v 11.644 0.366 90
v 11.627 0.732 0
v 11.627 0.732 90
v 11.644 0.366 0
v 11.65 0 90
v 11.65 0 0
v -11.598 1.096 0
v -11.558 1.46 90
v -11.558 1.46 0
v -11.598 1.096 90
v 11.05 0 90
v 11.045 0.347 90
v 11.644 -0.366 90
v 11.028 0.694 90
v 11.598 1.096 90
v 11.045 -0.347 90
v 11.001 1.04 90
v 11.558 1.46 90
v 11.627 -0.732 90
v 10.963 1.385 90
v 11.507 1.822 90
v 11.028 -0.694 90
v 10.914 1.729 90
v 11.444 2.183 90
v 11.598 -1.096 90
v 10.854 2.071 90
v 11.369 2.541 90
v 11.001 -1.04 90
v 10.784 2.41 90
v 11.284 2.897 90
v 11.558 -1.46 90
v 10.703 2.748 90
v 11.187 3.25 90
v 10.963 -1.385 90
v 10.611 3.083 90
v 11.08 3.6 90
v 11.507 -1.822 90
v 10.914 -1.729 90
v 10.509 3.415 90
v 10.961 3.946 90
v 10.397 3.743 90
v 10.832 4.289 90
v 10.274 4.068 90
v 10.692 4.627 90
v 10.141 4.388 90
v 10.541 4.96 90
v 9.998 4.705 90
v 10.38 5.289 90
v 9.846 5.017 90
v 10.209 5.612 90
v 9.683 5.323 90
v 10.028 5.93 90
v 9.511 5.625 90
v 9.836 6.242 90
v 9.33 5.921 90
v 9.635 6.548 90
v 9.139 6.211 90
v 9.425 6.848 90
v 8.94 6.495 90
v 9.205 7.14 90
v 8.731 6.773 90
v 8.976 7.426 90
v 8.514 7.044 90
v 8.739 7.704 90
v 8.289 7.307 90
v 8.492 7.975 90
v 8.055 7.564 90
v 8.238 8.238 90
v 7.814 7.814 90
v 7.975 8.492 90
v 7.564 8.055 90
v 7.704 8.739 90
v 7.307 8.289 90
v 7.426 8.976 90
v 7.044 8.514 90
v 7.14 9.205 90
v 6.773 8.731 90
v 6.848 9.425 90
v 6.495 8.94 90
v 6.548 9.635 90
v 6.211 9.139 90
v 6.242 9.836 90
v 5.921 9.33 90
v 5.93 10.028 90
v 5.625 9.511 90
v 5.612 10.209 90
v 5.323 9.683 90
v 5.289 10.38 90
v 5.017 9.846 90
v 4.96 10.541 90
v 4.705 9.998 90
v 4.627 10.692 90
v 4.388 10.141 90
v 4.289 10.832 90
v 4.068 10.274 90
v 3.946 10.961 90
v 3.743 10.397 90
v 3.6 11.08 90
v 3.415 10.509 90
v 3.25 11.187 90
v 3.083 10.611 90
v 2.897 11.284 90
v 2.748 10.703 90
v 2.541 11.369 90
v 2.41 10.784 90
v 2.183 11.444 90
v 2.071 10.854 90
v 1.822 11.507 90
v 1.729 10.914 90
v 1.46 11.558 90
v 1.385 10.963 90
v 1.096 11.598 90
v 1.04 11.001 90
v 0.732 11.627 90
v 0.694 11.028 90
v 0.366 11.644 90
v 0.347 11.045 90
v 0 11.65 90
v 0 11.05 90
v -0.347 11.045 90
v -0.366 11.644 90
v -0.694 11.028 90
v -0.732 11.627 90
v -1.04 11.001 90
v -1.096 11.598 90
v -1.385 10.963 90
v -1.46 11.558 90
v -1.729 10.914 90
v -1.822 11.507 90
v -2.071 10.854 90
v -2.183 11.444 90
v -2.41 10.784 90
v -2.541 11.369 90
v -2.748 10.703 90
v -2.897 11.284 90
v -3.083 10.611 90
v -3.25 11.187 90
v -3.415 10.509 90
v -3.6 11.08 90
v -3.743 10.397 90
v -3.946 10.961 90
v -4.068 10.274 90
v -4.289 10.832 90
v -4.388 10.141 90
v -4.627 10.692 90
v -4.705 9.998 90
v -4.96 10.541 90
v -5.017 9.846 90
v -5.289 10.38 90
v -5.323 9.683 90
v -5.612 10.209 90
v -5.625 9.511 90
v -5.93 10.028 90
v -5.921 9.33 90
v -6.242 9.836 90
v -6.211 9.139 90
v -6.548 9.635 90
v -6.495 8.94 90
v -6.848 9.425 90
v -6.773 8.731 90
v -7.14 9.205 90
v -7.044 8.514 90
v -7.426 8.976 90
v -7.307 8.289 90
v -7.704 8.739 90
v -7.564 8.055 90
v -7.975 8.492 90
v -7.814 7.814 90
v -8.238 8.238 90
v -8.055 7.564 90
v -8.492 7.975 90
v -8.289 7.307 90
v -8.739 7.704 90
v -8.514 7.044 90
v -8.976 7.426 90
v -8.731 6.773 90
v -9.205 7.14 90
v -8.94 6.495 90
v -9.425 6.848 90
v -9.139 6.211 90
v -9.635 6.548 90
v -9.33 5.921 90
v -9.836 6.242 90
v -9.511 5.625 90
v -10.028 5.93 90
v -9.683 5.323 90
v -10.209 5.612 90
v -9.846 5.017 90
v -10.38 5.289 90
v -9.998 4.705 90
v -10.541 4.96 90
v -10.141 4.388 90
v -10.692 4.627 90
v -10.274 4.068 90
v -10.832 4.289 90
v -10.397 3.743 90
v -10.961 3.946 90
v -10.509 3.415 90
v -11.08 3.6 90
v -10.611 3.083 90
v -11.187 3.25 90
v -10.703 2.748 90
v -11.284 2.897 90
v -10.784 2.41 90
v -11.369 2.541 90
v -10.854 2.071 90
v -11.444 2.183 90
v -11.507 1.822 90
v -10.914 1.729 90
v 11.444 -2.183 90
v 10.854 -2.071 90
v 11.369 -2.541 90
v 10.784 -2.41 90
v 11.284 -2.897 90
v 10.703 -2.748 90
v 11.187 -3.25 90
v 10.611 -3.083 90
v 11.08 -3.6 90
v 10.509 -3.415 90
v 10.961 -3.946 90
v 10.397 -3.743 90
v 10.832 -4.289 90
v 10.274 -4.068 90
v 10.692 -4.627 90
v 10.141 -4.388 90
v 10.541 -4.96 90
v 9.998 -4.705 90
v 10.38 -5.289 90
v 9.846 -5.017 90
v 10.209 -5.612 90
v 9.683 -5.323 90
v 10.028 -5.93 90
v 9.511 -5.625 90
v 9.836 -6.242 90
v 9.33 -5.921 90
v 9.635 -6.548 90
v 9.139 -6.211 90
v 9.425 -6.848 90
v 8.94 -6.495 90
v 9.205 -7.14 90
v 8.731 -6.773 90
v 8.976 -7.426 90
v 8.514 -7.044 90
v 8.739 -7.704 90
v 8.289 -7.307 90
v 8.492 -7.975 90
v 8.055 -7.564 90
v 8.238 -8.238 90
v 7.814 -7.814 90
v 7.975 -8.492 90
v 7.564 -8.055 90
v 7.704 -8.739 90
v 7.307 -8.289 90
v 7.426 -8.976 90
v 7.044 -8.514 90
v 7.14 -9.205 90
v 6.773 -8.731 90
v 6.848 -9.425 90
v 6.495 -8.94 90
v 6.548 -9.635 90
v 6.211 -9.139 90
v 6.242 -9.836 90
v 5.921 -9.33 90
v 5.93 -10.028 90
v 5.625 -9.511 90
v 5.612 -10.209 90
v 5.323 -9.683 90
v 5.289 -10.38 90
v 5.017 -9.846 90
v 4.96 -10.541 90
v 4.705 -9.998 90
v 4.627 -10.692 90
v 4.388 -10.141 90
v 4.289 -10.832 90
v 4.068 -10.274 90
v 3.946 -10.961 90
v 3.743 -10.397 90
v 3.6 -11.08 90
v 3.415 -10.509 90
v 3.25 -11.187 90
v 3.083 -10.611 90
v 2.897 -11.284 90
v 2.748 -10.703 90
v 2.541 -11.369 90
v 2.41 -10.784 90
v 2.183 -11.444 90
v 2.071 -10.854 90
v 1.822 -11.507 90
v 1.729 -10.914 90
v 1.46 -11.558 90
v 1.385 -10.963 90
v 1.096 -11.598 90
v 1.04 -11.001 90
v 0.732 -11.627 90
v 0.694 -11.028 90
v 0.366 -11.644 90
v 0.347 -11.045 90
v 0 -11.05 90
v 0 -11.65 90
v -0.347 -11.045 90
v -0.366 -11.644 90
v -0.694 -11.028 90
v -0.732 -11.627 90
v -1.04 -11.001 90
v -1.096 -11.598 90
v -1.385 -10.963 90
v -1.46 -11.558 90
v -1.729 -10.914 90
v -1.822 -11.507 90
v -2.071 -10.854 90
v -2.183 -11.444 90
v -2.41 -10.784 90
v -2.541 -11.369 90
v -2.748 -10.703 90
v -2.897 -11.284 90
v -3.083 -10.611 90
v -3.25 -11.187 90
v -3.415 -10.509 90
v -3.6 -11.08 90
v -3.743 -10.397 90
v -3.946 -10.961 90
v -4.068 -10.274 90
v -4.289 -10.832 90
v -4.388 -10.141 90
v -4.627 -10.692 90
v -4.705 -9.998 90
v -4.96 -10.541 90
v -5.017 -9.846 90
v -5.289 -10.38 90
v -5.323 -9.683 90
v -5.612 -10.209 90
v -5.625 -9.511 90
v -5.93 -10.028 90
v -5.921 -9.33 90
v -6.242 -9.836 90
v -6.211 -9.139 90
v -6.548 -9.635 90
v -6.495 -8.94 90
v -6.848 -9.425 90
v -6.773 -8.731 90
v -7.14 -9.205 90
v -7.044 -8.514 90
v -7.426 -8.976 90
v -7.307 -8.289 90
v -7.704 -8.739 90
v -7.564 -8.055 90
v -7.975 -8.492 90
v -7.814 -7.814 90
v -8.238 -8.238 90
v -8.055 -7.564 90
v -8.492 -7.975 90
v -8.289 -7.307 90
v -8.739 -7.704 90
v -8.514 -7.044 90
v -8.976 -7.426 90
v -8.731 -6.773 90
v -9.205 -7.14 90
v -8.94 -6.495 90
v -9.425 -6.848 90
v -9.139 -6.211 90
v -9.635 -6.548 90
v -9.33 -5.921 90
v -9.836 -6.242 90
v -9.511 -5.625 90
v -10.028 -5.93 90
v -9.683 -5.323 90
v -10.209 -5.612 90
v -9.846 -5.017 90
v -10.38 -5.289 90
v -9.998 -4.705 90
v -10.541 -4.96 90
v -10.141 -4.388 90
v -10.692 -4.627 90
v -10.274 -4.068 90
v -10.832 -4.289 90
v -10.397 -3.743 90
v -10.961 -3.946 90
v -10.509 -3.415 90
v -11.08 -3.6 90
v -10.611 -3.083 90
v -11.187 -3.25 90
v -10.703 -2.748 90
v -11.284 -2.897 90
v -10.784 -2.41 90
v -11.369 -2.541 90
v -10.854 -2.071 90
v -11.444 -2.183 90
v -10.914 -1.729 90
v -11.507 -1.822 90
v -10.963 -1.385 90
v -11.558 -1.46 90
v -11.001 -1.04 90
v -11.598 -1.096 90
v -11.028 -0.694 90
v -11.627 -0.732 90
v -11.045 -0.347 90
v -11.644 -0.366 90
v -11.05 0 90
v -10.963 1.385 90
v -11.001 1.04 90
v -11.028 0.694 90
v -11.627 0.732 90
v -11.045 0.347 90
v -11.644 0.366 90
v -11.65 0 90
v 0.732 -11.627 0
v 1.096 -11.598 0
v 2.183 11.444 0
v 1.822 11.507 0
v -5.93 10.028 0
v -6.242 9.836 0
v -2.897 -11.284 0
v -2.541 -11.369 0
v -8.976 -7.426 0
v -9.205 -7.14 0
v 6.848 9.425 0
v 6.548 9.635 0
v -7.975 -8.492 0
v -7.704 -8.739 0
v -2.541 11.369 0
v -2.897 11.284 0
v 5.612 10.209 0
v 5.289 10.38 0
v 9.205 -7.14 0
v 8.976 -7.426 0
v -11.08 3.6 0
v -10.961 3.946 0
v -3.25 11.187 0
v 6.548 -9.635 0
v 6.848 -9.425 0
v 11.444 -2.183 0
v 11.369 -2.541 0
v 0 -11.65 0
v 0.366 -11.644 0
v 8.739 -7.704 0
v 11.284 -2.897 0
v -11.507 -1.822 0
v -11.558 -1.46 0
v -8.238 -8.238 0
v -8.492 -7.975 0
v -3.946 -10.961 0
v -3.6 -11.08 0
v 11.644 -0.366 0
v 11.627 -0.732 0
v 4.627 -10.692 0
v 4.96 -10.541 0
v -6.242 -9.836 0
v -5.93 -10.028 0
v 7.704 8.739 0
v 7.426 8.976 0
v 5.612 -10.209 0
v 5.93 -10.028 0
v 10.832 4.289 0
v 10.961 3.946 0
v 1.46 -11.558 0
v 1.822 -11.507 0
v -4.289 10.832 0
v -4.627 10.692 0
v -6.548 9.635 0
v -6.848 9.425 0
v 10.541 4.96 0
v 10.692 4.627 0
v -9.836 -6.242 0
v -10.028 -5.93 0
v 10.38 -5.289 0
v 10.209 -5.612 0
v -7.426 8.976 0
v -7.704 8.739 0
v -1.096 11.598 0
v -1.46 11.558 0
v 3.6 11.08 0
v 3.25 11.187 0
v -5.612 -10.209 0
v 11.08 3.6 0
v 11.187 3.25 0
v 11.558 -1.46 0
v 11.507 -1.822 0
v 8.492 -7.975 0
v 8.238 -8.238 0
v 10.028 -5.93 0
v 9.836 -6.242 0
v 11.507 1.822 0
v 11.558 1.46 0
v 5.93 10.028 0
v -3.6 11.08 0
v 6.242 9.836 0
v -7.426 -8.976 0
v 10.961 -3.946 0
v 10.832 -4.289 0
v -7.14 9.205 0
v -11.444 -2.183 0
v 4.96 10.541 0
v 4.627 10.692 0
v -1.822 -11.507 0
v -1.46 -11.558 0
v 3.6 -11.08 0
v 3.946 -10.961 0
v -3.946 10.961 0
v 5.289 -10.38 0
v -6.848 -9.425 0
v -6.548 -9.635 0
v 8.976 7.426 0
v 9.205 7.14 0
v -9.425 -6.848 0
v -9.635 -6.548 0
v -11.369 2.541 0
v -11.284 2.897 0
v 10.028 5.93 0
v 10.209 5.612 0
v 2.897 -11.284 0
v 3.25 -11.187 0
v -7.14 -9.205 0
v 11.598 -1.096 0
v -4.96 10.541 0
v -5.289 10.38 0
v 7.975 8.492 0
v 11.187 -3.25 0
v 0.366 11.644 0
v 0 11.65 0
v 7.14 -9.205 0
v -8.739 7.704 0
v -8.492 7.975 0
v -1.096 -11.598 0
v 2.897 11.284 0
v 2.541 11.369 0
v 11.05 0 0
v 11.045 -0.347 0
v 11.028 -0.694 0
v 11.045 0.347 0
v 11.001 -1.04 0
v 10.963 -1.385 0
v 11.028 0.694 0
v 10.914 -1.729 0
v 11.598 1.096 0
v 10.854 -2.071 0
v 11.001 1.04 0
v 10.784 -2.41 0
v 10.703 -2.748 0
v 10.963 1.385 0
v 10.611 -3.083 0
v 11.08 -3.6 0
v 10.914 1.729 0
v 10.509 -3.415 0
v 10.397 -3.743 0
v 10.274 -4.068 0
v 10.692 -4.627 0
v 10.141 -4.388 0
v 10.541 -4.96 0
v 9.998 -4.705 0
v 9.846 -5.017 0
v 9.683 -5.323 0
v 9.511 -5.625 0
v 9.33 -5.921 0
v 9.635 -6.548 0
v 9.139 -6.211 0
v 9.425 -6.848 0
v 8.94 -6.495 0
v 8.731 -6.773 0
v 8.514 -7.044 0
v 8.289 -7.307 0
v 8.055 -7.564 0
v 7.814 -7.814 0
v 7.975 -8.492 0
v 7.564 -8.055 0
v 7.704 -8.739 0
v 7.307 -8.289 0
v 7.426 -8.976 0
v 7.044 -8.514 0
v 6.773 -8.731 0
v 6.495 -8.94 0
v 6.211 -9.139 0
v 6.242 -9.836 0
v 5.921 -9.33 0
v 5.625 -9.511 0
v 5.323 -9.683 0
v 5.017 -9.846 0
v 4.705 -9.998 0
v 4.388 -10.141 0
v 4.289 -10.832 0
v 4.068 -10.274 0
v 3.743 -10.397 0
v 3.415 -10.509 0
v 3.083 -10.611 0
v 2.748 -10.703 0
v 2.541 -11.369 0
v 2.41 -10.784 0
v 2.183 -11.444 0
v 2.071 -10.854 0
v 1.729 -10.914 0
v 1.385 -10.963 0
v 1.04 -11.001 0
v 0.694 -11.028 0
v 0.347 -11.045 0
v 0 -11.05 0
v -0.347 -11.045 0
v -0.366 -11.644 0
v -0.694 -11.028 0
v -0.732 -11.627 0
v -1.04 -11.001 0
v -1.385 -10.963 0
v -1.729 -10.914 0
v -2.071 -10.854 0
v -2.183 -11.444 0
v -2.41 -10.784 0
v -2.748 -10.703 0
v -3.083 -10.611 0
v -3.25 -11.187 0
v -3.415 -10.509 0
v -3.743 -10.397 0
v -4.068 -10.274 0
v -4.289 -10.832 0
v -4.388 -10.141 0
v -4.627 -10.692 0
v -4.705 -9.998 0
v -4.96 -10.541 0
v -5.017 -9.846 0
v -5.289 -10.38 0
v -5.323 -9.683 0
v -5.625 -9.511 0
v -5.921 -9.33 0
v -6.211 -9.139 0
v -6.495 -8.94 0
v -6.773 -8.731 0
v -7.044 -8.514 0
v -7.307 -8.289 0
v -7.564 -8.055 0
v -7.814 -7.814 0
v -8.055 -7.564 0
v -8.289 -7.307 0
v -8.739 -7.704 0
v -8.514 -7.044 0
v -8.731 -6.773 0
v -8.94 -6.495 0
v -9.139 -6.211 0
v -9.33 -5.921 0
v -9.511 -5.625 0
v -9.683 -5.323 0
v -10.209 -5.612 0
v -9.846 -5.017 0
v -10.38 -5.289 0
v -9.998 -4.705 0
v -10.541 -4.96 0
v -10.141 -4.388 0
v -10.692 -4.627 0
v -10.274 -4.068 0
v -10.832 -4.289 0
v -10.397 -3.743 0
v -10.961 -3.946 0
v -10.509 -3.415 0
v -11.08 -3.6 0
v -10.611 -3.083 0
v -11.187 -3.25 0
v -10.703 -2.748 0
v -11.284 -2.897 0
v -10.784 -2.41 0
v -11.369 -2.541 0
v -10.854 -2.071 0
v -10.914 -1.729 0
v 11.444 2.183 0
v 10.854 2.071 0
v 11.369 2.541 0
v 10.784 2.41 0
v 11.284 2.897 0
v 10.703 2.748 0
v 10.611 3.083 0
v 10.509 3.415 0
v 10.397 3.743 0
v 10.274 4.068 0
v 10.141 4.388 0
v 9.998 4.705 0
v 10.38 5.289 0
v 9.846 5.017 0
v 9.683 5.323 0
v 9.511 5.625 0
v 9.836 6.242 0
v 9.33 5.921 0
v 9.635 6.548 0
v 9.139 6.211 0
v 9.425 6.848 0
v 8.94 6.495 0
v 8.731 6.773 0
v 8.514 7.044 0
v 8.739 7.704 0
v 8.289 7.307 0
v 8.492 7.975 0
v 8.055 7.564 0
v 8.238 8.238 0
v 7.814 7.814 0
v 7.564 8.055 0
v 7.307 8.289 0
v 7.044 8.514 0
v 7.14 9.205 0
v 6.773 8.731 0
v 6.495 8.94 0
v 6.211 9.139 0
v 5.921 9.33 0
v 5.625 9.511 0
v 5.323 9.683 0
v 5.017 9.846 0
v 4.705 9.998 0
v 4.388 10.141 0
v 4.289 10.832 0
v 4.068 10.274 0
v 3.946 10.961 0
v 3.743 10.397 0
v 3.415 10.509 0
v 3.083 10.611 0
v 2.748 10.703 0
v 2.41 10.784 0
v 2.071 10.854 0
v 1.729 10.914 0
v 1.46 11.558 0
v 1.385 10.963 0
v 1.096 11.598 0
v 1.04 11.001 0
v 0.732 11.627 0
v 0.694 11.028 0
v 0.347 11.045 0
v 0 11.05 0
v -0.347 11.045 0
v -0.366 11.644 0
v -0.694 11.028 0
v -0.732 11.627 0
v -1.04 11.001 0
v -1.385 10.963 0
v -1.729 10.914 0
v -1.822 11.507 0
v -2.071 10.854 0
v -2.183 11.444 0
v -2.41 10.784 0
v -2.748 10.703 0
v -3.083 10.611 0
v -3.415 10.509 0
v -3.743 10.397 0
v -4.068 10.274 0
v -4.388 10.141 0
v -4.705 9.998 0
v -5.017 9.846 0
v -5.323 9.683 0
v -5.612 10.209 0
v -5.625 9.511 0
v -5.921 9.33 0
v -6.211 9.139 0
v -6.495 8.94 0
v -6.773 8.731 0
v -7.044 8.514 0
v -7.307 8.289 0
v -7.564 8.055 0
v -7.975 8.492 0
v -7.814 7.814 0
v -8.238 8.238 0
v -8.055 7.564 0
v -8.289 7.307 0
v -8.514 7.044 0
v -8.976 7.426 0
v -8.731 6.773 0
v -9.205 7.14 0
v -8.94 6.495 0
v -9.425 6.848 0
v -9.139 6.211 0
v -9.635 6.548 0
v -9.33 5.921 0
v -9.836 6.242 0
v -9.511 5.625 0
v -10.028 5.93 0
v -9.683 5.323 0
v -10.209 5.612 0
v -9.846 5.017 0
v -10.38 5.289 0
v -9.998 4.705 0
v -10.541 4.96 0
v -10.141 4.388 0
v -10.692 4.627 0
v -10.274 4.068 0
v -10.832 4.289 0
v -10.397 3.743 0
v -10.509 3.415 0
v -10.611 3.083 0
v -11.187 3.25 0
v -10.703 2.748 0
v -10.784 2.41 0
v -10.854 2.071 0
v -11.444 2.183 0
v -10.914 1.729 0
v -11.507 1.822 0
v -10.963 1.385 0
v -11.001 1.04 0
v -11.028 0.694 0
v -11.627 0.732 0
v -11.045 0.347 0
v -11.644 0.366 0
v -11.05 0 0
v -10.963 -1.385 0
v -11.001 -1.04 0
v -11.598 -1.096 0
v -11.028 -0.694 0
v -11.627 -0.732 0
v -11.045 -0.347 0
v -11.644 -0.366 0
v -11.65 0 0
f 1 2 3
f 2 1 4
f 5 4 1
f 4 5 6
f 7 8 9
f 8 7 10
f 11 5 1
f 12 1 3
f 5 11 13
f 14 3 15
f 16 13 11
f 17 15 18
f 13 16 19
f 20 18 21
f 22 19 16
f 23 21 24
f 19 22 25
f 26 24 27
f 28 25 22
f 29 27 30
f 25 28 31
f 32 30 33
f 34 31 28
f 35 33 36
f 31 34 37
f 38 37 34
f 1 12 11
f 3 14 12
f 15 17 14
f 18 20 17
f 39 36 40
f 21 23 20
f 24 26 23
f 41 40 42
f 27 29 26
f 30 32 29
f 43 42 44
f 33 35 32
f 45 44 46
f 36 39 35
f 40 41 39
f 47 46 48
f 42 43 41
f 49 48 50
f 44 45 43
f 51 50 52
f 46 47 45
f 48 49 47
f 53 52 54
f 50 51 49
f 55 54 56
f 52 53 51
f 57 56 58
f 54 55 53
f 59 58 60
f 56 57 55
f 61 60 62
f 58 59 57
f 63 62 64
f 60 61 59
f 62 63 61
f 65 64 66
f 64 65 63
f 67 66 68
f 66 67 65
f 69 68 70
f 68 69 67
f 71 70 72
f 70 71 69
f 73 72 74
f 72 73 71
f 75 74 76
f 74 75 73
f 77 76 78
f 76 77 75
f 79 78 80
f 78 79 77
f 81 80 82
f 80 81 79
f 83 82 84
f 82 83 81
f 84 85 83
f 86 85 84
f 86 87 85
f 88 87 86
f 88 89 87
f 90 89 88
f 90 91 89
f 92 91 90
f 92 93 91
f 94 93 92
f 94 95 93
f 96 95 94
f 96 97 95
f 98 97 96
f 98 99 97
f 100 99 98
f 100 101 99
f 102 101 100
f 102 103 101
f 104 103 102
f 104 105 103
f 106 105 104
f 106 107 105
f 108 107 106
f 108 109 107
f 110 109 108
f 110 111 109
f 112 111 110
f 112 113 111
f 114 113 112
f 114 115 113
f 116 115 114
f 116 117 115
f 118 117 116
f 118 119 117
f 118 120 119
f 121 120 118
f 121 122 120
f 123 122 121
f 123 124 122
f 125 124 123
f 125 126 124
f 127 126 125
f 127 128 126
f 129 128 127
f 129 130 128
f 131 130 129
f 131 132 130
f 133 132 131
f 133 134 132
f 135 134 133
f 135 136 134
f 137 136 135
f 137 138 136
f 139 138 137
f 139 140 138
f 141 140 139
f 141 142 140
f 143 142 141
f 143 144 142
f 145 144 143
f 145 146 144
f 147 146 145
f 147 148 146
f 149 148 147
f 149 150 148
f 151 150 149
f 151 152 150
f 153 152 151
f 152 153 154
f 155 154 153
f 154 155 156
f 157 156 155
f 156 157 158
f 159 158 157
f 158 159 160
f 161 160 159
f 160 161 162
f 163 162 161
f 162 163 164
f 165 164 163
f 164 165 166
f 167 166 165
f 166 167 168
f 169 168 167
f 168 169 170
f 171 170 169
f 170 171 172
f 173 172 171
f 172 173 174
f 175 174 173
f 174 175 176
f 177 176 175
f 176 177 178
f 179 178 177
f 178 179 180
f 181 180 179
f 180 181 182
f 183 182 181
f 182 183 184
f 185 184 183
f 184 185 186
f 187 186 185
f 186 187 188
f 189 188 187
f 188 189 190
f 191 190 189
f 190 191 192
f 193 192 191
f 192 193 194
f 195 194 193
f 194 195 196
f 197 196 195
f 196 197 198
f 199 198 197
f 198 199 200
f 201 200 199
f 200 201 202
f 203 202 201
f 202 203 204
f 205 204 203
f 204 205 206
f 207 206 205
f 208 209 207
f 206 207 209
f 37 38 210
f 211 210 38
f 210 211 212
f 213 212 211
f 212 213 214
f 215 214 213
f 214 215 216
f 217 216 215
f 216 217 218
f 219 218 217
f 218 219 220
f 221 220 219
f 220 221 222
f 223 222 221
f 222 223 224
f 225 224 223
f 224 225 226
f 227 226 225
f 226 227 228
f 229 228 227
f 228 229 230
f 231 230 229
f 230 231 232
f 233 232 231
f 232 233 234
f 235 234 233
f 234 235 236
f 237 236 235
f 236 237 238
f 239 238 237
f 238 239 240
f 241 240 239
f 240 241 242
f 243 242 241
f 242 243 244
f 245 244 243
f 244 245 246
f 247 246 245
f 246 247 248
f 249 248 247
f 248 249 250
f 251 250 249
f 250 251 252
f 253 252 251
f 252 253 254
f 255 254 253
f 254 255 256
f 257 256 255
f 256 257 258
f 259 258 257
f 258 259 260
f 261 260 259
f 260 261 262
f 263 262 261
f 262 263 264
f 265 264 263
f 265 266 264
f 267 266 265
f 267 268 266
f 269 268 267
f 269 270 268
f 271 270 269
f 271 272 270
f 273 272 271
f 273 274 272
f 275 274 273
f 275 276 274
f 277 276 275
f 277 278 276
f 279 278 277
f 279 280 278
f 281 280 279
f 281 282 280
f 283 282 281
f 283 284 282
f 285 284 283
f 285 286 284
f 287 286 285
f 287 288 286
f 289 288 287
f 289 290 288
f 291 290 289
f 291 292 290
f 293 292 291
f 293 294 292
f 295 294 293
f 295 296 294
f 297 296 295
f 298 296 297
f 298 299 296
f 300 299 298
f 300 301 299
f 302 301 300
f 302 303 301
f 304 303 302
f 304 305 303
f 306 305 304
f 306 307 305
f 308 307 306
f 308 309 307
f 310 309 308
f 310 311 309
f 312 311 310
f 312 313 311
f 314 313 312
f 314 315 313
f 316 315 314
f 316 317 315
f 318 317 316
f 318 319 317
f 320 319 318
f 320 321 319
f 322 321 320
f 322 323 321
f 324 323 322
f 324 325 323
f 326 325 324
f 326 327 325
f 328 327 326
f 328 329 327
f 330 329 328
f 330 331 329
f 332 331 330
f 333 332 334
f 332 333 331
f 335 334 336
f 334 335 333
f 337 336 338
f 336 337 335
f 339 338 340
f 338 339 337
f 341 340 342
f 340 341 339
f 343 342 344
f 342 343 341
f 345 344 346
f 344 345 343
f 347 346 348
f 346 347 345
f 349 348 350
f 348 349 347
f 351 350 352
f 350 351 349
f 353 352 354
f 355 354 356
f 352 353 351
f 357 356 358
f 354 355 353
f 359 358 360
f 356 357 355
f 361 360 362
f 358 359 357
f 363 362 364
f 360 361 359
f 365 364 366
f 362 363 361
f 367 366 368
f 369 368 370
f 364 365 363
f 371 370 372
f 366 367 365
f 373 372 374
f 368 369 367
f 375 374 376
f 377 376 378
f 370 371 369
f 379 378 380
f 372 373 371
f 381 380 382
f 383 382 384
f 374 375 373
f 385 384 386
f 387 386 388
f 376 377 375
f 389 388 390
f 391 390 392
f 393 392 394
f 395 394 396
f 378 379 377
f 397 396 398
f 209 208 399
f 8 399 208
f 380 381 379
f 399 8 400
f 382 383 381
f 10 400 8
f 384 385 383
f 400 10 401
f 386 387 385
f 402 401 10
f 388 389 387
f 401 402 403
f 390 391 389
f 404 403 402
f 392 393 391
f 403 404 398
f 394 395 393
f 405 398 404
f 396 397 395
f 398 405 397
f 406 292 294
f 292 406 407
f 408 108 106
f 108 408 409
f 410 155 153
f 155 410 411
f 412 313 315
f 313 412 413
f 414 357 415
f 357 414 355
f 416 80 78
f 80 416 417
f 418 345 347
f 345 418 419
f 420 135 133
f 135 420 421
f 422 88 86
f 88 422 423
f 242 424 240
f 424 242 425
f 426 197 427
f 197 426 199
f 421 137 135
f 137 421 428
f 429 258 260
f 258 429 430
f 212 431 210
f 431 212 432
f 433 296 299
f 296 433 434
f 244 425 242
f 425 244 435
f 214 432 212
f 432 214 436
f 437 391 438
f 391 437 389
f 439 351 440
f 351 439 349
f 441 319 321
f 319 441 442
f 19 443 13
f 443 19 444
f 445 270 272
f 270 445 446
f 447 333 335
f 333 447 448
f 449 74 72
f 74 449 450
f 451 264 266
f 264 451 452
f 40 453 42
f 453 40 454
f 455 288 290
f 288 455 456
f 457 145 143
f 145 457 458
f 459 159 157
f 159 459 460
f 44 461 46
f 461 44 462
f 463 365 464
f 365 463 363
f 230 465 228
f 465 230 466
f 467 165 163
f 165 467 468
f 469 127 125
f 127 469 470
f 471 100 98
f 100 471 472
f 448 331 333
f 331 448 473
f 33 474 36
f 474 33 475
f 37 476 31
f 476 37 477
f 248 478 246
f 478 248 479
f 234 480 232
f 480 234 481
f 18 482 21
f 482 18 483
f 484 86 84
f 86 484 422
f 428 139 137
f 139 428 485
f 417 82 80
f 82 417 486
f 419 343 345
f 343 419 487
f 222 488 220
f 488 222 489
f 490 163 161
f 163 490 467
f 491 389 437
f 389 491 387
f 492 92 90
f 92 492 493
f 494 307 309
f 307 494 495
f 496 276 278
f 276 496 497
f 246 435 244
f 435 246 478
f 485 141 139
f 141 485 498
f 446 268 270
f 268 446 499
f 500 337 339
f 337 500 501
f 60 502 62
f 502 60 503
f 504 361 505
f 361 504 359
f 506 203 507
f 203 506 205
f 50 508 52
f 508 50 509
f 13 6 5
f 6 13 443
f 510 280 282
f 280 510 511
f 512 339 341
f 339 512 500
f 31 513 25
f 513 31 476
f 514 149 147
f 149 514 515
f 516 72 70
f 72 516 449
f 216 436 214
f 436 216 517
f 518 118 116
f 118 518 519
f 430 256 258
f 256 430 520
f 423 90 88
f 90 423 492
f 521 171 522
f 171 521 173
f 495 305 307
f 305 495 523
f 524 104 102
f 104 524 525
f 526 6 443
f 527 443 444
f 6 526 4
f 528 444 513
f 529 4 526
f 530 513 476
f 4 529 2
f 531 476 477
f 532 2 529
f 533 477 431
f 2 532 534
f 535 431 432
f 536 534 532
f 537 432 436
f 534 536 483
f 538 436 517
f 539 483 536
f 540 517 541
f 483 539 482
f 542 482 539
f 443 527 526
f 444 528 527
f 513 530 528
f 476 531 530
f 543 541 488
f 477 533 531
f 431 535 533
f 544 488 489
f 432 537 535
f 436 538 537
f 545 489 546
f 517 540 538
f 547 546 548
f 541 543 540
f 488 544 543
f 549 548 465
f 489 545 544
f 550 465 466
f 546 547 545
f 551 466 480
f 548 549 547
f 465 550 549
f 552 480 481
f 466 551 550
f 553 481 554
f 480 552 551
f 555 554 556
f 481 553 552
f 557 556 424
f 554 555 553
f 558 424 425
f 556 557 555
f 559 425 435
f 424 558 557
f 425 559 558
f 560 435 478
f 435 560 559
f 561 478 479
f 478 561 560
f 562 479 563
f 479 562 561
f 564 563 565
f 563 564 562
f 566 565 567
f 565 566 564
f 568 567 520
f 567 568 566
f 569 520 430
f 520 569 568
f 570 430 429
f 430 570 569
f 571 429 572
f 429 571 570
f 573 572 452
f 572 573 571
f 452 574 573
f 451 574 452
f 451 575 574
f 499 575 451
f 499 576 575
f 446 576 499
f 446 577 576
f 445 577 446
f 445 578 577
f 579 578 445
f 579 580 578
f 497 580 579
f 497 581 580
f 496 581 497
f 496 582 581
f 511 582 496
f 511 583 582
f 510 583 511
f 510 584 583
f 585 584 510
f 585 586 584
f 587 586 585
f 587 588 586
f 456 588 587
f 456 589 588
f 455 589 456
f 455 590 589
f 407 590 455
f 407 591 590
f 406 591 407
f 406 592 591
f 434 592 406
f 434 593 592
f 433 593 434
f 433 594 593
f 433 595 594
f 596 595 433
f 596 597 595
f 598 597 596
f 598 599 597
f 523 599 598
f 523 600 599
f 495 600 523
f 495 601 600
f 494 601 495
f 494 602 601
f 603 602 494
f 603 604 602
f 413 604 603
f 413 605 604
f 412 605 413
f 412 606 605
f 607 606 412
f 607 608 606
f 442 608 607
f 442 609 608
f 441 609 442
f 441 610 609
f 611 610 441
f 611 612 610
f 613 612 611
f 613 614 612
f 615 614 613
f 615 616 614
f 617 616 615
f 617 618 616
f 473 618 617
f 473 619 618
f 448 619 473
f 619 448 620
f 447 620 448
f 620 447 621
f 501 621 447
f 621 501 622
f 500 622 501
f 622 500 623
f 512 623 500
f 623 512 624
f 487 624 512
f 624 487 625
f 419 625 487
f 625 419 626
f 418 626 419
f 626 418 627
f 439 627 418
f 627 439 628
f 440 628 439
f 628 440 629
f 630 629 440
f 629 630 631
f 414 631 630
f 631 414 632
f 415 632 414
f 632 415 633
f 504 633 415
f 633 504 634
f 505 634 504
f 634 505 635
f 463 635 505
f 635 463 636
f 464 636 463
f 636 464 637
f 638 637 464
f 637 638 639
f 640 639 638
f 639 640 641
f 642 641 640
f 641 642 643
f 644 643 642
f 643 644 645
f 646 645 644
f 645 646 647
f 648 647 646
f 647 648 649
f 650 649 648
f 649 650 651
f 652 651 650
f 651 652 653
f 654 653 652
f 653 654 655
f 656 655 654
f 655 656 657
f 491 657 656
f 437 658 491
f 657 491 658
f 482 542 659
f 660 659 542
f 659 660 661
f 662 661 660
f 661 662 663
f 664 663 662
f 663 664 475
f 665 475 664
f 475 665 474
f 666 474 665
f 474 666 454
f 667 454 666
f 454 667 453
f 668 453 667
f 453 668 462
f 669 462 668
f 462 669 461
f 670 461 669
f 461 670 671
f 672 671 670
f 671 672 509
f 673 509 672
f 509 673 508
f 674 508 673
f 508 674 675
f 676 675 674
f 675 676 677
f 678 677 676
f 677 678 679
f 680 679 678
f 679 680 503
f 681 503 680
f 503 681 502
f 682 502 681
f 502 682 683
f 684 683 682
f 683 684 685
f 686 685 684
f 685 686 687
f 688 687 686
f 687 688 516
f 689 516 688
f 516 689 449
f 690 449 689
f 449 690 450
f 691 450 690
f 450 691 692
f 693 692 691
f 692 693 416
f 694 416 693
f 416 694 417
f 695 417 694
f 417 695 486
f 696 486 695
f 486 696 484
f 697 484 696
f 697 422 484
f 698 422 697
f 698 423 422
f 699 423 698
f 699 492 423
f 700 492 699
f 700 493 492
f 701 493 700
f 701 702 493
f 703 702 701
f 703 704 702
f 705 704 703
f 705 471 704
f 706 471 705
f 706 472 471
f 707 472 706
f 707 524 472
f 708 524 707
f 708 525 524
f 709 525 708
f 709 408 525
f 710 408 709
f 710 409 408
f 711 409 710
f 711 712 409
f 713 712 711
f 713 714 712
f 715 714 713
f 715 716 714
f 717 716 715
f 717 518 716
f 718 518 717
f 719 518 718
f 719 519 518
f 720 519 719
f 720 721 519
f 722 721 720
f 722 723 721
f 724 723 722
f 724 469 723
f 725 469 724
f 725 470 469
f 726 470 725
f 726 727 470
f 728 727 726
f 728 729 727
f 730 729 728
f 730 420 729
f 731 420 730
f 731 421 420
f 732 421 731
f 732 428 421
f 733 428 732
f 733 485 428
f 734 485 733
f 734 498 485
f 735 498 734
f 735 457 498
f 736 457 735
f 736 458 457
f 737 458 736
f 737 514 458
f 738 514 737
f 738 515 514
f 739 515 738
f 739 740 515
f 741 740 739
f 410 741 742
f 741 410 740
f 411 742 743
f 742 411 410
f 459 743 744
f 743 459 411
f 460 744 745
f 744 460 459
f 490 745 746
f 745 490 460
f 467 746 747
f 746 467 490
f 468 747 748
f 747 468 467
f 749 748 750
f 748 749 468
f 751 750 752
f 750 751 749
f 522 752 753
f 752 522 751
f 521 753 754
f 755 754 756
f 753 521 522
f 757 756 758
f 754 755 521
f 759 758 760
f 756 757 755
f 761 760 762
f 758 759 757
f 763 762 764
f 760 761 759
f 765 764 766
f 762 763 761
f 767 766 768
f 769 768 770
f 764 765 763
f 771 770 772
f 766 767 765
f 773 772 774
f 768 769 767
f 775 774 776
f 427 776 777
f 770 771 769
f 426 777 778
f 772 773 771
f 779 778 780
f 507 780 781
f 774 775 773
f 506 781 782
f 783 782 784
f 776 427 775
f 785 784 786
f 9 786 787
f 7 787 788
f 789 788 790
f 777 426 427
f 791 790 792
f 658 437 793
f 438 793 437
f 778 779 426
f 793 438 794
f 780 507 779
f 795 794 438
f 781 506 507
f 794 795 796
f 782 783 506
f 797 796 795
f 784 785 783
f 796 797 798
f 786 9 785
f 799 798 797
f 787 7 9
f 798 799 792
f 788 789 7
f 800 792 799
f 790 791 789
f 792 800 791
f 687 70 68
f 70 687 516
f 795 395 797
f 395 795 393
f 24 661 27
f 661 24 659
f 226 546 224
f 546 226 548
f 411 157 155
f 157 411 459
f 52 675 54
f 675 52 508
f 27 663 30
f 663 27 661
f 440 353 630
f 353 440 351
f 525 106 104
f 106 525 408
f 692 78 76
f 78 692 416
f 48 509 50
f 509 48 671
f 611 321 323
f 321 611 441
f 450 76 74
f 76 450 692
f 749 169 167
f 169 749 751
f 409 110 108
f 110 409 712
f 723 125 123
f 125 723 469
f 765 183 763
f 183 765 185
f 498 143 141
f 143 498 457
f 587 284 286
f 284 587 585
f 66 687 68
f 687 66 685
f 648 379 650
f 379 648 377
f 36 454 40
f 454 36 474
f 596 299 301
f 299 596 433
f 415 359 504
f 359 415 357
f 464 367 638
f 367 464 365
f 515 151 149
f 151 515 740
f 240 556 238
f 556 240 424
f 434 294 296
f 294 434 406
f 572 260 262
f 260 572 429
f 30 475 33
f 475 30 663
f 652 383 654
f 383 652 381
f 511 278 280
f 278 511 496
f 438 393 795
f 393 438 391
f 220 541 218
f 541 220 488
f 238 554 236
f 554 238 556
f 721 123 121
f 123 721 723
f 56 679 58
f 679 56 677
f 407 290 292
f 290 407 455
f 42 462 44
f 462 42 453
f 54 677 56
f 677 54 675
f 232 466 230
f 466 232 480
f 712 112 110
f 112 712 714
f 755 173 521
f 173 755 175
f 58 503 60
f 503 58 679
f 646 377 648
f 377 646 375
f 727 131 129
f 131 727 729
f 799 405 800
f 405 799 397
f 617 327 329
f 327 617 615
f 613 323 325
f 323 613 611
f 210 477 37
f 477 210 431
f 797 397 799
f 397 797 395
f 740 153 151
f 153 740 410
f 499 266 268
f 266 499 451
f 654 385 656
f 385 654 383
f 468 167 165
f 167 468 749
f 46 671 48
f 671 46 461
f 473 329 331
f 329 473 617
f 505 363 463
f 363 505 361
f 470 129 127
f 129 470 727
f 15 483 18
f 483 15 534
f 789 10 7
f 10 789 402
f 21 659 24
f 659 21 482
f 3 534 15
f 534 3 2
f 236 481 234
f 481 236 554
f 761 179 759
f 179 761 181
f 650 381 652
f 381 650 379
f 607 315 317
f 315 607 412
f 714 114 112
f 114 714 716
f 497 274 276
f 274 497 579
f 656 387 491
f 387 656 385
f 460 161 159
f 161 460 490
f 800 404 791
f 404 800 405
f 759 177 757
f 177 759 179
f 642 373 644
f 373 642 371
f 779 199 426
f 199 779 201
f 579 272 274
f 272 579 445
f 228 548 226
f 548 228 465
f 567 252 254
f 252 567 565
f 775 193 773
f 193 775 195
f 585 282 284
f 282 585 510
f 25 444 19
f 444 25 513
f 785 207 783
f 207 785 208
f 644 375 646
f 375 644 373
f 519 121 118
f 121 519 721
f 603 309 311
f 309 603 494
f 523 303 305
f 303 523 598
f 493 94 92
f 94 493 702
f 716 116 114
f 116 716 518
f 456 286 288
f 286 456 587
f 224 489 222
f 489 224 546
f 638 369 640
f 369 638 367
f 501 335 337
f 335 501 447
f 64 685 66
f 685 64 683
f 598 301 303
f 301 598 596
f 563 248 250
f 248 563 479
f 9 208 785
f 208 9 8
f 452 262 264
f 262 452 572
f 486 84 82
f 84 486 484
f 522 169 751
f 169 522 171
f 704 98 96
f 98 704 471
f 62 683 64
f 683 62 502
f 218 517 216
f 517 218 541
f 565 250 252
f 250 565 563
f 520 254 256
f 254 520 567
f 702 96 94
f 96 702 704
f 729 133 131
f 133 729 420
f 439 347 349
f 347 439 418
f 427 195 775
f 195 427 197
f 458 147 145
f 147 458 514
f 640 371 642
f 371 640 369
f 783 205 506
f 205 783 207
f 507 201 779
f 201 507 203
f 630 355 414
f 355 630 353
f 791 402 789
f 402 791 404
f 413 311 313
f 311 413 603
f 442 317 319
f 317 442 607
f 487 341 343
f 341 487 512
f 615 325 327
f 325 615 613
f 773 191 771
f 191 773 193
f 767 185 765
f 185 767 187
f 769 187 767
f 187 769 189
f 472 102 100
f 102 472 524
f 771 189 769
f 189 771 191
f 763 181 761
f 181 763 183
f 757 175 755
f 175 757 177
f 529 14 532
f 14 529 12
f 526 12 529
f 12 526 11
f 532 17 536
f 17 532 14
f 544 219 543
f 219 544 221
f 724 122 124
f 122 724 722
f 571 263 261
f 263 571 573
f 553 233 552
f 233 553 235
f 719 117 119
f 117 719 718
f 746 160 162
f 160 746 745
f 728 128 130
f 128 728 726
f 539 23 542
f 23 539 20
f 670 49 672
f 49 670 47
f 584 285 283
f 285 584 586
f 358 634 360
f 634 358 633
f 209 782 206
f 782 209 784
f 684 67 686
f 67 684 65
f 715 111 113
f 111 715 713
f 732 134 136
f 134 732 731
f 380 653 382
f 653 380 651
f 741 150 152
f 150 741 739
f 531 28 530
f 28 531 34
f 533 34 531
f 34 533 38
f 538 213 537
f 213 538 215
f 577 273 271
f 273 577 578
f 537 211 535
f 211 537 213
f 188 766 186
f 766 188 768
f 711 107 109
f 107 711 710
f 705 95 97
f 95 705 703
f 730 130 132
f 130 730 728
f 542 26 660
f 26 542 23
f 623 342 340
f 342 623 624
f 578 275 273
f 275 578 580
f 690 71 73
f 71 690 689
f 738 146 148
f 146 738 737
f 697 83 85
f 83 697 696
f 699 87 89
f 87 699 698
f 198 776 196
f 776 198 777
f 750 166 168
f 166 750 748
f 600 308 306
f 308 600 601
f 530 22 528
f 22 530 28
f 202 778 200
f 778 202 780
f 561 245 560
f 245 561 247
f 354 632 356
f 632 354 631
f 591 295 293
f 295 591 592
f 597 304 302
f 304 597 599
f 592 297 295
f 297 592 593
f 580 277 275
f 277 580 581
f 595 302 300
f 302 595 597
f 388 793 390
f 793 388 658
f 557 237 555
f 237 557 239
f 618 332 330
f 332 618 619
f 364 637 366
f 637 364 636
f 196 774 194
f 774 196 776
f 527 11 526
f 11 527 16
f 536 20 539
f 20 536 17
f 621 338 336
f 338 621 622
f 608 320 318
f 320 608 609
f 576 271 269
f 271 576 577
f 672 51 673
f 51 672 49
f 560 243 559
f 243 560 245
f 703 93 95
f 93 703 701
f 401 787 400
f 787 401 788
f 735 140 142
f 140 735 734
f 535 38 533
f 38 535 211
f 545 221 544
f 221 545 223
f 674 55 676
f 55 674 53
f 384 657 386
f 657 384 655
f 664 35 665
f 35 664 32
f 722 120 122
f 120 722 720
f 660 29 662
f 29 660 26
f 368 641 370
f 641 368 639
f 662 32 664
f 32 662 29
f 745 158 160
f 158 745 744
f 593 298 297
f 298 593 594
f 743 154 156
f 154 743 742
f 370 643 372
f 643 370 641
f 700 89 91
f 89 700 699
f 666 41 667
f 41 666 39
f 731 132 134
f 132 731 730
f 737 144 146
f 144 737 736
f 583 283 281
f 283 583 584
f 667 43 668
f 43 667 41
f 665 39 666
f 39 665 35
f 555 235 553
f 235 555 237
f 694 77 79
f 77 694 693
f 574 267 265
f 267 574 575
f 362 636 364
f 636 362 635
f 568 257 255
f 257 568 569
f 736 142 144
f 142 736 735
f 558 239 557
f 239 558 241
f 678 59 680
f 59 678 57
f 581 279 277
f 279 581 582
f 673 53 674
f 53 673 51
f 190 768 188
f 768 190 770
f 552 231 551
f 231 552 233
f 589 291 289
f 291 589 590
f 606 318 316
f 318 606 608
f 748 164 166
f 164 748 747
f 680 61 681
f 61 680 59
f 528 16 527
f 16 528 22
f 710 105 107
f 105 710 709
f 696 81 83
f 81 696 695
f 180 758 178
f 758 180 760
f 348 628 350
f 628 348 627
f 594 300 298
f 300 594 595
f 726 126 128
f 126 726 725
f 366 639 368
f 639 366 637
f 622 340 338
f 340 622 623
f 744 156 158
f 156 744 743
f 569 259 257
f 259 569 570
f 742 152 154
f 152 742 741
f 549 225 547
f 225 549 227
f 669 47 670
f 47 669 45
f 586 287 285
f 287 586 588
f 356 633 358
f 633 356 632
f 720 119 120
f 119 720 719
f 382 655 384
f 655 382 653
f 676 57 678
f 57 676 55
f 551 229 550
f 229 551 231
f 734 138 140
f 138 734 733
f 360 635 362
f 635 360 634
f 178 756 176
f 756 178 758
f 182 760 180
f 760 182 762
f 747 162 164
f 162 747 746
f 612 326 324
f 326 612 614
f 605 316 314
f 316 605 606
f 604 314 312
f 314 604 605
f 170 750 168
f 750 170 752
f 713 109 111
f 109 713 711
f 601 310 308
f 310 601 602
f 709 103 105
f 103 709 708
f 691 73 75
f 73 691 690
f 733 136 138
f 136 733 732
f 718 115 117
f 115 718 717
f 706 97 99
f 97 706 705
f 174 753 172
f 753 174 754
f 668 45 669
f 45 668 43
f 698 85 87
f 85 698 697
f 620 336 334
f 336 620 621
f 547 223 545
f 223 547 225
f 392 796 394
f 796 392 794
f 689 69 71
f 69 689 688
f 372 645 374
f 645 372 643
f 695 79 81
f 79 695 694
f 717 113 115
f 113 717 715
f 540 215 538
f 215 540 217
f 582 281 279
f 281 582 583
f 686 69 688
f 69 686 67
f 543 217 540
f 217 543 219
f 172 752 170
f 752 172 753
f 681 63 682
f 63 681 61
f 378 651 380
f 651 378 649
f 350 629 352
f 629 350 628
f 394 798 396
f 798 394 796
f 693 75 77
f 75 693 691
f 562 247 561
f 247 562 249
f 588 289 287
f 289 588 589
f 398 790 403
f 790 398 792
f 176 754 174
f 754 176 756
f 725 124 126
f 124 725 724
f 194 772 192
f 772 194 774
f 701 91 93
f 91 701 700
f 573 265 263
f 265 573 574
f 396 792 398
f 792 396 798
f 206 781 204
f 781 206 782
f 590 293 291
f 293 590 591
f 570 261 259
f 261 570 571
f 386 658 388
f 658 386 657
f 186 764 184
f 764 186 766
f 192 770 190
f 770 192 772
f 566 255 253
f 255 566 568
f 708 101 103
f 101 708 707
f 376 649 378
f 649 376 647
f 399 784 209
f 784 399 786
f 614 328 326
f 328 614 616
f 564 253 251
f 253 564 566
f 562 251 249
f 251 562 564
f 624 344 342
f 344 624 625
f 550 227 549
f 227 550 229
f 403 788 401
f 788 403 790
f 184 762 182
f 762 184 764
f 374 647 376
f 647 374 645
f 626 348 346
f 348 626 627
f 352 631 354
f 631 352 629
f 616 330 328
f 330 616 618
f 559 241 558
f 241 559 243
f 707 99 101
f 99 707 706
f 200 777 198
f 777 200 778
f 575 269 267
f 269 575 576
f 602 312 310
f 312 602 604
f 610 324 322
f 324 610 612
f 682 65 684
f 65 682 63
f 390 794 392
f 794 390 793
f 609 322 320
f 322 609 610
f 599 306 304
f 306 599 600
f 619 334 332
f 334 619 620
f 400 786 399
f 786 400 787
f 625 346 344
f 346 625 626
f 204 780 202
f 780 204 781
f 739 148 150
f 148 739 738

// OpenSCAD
// i got the original code from : https://www.thingiverse.com/thing:1680427/#files 



Thickness = 0.6; // Thickness of the tube walls (your nozzle size)

InnerDiameter = 22.1; // Inner diameter of tube
OuterDiameter = InnerDiameter+(Thickness*2); // Outer diameter of tube
Height = 90; // Height of the lower section


module tube(od, id, h) {
    difference() {
        cylinder(r=od/2, h=h,$fn=200);
        cylinder(r=id/2, h=h,$fn=200);
    }
}

tube(OuterDiameter, InnerDiameter, Height);
